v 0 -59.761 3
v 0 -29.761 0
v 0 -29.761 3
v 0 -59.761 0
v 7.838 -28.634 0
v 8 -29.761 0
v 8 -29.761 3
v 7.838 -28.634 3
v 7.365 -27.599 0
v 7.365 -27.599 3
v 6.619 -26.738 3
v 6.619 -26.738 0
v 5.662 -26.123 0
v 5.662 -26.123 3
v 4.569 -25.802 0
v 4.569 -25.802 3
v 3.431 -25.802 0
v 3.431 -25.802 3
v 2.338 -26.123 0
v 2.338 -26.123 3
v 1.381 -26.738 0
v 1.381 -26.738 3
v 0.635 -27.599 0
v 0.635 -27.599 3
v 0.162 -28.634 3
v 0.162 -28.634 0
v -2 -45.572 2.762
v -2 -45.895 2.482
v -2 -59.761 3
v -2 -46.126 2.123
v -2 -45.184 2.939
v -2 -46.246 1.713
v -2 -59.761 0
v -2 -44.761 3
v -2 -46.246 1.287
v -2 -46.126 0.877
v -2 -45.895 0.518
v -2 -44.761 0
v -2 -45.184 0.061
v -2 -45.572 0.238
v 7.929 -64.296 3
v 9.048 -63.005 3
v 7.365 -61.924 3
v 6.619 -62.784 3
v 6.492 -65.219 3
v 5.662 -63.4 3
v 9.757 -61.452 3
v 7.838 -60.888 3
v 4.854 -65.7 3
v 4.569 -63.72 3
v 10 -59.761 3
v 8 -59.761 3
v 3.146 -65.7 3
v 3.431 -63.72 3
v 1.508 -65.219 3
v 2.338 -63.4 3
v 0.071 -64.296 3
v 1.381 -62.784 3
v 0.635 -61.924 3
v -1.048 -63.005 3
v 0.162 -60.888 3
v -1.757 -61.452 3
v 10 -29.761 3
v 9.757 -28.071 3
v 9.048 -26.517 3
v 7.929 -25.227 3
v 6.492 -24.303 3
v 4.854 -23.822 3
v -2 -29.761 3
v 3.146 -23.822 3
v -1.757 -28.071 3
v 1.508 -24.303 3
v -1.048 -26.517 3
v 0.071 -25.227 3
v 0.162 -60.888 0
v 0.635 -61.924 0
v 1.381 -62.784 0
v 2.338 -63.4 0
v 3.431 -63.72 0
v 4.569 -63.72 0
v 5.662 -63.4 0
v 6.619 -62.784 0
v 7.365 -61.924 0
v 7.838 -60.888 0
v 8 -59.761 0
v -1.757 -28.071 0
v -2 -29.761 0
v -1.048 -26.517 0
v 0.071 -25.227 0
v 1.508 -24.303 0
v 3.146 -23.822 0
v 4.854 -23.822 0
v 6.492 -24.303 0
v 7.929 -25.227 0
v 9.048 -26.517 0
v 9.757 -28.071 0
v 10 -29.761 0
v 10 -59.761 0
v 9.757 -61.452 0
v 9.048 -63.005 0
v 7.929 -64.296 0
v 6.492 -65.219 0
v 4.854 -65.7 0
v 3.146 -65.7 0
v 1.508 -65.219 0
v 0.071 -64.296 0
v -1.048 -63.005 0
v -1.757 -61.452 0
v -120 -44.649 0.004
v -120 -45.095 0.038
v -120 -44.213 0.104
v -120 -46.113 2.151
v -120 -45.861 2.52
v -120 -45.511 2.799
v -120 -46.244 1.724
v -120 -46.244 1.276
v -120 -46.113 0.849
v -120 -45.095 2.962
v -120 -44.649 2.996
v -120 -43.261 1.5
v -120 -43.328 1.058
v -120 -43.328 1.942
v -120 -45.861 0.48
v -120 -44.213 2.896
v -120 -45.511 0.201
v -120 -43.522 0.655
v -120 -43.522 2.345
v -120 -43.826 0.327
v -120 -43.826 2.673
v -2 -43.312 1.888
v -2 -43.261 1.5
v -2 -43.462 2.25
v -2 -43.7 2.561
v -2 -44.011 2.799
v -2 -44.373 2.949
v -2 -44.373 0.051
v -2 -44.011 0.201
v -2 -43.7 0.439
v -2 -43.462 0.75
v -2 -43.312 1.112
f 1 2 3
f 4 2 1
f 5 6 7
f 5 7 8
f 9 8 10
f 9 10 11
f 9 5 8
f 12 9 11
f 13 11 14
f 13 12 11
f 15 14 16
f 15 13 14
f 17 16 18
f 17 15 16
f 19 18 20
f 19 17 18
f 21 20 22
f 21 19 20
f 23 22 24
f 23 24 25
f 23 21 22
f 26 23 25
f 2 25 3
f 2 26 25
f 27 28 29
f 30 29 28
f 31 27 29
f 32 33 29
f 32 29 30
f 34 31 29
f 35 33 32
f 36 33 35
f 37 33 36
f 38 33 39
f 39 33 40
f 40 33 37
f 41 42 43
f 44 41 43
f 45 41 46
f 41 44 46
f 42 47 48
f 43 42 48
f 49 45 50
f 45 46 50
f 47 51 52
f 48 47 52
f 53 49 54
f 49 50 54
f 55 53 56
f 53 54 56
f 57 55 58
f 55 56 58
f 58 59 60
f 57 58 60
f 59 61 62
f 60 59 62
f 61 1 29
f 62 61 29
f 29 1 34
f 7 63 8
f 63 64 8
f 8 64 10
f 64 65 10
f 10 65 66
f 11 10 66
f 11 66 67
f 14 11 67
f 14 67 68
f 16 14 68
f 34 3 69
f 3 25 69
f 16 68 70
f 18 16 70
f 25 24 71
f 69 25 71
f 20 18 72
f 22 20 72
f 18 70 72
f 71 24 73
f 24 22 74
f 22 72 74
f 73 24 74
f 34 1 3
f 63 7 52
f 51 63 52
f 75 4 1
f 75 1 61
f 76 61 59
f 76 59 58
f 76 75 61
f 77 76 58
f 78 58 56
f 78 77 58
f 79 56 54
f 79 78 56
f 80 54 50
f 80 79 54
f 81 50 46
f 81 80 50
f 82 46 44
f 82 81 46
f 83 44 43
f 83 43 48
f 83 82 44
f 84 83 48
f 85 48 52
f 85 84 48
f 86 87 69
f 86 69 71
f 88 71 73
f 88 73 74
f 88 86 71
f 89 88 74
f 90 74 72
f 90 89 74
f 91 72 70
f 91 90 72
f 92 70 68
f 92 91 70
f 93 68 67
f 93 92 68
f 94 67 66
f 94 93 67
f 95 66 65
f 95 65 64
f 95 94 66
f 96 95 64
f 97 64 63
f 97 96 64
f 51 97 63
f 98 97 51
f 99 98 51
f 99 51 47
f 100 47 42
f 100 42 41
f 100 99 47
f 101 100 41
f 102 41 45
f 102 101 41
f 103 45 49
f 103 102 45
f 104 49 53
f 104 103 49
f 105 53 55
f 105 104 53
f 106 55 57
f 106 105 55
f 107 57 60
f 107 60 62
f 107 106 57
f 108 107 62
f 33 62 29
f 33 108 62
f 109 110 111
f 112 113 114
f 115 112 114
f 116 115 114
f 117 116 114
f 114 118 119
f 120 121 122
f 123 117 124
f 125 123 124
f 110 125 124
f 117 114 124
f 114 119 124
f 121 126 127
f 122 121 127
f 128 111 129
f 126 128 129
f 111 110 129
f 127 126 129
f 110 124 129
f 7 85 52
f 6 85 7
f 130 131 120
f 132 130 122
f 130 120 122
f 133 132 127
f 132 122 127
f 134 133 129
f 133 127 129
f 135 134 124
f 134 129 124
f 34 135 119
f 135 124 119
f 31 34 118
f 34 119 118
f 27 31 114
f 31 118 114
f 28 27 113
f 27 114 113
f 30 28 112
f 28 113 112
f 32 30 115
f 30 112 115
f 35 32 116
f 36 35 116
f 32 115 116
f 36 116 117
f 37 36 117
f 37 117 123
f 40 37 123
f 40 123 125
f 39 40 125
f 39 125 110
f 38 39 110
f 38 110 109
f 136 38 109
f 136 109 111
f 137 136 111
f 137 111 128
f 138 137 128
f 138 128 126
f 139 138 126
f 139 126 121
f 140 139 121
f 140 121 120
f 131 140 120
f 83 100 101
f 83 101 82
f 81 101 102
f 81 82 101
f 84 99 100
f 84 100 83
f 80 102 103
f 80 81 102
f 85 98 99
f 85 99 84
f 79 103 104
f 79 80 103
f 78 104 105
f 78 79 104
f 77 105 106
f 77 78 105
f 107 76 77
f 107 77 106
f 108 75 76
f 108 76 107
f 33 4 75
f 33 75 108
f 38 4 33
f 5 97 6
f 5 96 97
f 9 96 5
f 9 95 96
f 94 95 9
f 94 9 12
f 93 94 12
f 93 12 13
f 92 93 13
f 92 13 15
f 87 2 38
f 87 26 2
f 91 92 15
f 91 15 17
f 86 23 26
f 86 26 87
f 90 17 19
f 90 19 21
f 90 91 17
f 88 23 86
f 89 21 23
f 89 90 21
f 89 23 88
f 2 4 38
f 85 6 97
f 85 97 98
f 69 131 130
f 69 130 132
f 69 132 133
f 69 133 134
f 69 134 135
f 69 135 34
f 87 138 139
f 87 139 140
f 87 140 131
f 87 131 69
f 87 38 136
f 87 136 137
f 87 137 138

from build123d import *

# Parameters (mm, degrees)
EXTRUDE_1_DEPTH     = 3
EXTRUDE_START       = -120
EXTRUDE_2_OUTLINE_R = 1.5
EXTRUDE_2_DEPTH     = 118


# Read off the part's stored shape, not the designer's step: 凸台-拉伸2
with BuildPart() as part:
    # 草图1 → 凸台-拉伸1 (new body)
    with BuildSketch(Plane.XY):
        with BuildLine():
            Line((10, -29.761156884), (10, -59.761156884))
            ThreePointArc((10, -59.761156884), (4, -65.761156884), (-2, -59.761156884))
            Line((-2, -59.761156884), (-2, -29.761156884))
            ThreePointArc((-2, -29.761156884), (4, -23.761156884), (10, -29.761156884))
        make_face()
        with BuildLine():
            Line((0, -29.761156884), (0, -59.761156884))
            ThreePointArc((0, -59.761156884), (4, -63.761156884), (8, -59.761156884))
            Line((8, -59.761156884), (8, -29.761156884))
            ThreePointArc((8, -29.761156884), (4, -25.761156884), (0, -29.761156884))
        make_face(mode=Mode.SUBTRACT)
    extrude(amount=EXTRUDE_1_DEPTH)

    # 凸台-拉伸2 outline → 凸台-拉伸2 (add)
    with BuildSketch(Plane.YZ.offset(EXTRUDE_START)):
        with Locations((-44.761156884, 1.5)):
            Circle(EXTRUDE_2_OUTLINE_R)
    extrude(amount=EXTRUDE_2_DEPTH)


solid = part.part
